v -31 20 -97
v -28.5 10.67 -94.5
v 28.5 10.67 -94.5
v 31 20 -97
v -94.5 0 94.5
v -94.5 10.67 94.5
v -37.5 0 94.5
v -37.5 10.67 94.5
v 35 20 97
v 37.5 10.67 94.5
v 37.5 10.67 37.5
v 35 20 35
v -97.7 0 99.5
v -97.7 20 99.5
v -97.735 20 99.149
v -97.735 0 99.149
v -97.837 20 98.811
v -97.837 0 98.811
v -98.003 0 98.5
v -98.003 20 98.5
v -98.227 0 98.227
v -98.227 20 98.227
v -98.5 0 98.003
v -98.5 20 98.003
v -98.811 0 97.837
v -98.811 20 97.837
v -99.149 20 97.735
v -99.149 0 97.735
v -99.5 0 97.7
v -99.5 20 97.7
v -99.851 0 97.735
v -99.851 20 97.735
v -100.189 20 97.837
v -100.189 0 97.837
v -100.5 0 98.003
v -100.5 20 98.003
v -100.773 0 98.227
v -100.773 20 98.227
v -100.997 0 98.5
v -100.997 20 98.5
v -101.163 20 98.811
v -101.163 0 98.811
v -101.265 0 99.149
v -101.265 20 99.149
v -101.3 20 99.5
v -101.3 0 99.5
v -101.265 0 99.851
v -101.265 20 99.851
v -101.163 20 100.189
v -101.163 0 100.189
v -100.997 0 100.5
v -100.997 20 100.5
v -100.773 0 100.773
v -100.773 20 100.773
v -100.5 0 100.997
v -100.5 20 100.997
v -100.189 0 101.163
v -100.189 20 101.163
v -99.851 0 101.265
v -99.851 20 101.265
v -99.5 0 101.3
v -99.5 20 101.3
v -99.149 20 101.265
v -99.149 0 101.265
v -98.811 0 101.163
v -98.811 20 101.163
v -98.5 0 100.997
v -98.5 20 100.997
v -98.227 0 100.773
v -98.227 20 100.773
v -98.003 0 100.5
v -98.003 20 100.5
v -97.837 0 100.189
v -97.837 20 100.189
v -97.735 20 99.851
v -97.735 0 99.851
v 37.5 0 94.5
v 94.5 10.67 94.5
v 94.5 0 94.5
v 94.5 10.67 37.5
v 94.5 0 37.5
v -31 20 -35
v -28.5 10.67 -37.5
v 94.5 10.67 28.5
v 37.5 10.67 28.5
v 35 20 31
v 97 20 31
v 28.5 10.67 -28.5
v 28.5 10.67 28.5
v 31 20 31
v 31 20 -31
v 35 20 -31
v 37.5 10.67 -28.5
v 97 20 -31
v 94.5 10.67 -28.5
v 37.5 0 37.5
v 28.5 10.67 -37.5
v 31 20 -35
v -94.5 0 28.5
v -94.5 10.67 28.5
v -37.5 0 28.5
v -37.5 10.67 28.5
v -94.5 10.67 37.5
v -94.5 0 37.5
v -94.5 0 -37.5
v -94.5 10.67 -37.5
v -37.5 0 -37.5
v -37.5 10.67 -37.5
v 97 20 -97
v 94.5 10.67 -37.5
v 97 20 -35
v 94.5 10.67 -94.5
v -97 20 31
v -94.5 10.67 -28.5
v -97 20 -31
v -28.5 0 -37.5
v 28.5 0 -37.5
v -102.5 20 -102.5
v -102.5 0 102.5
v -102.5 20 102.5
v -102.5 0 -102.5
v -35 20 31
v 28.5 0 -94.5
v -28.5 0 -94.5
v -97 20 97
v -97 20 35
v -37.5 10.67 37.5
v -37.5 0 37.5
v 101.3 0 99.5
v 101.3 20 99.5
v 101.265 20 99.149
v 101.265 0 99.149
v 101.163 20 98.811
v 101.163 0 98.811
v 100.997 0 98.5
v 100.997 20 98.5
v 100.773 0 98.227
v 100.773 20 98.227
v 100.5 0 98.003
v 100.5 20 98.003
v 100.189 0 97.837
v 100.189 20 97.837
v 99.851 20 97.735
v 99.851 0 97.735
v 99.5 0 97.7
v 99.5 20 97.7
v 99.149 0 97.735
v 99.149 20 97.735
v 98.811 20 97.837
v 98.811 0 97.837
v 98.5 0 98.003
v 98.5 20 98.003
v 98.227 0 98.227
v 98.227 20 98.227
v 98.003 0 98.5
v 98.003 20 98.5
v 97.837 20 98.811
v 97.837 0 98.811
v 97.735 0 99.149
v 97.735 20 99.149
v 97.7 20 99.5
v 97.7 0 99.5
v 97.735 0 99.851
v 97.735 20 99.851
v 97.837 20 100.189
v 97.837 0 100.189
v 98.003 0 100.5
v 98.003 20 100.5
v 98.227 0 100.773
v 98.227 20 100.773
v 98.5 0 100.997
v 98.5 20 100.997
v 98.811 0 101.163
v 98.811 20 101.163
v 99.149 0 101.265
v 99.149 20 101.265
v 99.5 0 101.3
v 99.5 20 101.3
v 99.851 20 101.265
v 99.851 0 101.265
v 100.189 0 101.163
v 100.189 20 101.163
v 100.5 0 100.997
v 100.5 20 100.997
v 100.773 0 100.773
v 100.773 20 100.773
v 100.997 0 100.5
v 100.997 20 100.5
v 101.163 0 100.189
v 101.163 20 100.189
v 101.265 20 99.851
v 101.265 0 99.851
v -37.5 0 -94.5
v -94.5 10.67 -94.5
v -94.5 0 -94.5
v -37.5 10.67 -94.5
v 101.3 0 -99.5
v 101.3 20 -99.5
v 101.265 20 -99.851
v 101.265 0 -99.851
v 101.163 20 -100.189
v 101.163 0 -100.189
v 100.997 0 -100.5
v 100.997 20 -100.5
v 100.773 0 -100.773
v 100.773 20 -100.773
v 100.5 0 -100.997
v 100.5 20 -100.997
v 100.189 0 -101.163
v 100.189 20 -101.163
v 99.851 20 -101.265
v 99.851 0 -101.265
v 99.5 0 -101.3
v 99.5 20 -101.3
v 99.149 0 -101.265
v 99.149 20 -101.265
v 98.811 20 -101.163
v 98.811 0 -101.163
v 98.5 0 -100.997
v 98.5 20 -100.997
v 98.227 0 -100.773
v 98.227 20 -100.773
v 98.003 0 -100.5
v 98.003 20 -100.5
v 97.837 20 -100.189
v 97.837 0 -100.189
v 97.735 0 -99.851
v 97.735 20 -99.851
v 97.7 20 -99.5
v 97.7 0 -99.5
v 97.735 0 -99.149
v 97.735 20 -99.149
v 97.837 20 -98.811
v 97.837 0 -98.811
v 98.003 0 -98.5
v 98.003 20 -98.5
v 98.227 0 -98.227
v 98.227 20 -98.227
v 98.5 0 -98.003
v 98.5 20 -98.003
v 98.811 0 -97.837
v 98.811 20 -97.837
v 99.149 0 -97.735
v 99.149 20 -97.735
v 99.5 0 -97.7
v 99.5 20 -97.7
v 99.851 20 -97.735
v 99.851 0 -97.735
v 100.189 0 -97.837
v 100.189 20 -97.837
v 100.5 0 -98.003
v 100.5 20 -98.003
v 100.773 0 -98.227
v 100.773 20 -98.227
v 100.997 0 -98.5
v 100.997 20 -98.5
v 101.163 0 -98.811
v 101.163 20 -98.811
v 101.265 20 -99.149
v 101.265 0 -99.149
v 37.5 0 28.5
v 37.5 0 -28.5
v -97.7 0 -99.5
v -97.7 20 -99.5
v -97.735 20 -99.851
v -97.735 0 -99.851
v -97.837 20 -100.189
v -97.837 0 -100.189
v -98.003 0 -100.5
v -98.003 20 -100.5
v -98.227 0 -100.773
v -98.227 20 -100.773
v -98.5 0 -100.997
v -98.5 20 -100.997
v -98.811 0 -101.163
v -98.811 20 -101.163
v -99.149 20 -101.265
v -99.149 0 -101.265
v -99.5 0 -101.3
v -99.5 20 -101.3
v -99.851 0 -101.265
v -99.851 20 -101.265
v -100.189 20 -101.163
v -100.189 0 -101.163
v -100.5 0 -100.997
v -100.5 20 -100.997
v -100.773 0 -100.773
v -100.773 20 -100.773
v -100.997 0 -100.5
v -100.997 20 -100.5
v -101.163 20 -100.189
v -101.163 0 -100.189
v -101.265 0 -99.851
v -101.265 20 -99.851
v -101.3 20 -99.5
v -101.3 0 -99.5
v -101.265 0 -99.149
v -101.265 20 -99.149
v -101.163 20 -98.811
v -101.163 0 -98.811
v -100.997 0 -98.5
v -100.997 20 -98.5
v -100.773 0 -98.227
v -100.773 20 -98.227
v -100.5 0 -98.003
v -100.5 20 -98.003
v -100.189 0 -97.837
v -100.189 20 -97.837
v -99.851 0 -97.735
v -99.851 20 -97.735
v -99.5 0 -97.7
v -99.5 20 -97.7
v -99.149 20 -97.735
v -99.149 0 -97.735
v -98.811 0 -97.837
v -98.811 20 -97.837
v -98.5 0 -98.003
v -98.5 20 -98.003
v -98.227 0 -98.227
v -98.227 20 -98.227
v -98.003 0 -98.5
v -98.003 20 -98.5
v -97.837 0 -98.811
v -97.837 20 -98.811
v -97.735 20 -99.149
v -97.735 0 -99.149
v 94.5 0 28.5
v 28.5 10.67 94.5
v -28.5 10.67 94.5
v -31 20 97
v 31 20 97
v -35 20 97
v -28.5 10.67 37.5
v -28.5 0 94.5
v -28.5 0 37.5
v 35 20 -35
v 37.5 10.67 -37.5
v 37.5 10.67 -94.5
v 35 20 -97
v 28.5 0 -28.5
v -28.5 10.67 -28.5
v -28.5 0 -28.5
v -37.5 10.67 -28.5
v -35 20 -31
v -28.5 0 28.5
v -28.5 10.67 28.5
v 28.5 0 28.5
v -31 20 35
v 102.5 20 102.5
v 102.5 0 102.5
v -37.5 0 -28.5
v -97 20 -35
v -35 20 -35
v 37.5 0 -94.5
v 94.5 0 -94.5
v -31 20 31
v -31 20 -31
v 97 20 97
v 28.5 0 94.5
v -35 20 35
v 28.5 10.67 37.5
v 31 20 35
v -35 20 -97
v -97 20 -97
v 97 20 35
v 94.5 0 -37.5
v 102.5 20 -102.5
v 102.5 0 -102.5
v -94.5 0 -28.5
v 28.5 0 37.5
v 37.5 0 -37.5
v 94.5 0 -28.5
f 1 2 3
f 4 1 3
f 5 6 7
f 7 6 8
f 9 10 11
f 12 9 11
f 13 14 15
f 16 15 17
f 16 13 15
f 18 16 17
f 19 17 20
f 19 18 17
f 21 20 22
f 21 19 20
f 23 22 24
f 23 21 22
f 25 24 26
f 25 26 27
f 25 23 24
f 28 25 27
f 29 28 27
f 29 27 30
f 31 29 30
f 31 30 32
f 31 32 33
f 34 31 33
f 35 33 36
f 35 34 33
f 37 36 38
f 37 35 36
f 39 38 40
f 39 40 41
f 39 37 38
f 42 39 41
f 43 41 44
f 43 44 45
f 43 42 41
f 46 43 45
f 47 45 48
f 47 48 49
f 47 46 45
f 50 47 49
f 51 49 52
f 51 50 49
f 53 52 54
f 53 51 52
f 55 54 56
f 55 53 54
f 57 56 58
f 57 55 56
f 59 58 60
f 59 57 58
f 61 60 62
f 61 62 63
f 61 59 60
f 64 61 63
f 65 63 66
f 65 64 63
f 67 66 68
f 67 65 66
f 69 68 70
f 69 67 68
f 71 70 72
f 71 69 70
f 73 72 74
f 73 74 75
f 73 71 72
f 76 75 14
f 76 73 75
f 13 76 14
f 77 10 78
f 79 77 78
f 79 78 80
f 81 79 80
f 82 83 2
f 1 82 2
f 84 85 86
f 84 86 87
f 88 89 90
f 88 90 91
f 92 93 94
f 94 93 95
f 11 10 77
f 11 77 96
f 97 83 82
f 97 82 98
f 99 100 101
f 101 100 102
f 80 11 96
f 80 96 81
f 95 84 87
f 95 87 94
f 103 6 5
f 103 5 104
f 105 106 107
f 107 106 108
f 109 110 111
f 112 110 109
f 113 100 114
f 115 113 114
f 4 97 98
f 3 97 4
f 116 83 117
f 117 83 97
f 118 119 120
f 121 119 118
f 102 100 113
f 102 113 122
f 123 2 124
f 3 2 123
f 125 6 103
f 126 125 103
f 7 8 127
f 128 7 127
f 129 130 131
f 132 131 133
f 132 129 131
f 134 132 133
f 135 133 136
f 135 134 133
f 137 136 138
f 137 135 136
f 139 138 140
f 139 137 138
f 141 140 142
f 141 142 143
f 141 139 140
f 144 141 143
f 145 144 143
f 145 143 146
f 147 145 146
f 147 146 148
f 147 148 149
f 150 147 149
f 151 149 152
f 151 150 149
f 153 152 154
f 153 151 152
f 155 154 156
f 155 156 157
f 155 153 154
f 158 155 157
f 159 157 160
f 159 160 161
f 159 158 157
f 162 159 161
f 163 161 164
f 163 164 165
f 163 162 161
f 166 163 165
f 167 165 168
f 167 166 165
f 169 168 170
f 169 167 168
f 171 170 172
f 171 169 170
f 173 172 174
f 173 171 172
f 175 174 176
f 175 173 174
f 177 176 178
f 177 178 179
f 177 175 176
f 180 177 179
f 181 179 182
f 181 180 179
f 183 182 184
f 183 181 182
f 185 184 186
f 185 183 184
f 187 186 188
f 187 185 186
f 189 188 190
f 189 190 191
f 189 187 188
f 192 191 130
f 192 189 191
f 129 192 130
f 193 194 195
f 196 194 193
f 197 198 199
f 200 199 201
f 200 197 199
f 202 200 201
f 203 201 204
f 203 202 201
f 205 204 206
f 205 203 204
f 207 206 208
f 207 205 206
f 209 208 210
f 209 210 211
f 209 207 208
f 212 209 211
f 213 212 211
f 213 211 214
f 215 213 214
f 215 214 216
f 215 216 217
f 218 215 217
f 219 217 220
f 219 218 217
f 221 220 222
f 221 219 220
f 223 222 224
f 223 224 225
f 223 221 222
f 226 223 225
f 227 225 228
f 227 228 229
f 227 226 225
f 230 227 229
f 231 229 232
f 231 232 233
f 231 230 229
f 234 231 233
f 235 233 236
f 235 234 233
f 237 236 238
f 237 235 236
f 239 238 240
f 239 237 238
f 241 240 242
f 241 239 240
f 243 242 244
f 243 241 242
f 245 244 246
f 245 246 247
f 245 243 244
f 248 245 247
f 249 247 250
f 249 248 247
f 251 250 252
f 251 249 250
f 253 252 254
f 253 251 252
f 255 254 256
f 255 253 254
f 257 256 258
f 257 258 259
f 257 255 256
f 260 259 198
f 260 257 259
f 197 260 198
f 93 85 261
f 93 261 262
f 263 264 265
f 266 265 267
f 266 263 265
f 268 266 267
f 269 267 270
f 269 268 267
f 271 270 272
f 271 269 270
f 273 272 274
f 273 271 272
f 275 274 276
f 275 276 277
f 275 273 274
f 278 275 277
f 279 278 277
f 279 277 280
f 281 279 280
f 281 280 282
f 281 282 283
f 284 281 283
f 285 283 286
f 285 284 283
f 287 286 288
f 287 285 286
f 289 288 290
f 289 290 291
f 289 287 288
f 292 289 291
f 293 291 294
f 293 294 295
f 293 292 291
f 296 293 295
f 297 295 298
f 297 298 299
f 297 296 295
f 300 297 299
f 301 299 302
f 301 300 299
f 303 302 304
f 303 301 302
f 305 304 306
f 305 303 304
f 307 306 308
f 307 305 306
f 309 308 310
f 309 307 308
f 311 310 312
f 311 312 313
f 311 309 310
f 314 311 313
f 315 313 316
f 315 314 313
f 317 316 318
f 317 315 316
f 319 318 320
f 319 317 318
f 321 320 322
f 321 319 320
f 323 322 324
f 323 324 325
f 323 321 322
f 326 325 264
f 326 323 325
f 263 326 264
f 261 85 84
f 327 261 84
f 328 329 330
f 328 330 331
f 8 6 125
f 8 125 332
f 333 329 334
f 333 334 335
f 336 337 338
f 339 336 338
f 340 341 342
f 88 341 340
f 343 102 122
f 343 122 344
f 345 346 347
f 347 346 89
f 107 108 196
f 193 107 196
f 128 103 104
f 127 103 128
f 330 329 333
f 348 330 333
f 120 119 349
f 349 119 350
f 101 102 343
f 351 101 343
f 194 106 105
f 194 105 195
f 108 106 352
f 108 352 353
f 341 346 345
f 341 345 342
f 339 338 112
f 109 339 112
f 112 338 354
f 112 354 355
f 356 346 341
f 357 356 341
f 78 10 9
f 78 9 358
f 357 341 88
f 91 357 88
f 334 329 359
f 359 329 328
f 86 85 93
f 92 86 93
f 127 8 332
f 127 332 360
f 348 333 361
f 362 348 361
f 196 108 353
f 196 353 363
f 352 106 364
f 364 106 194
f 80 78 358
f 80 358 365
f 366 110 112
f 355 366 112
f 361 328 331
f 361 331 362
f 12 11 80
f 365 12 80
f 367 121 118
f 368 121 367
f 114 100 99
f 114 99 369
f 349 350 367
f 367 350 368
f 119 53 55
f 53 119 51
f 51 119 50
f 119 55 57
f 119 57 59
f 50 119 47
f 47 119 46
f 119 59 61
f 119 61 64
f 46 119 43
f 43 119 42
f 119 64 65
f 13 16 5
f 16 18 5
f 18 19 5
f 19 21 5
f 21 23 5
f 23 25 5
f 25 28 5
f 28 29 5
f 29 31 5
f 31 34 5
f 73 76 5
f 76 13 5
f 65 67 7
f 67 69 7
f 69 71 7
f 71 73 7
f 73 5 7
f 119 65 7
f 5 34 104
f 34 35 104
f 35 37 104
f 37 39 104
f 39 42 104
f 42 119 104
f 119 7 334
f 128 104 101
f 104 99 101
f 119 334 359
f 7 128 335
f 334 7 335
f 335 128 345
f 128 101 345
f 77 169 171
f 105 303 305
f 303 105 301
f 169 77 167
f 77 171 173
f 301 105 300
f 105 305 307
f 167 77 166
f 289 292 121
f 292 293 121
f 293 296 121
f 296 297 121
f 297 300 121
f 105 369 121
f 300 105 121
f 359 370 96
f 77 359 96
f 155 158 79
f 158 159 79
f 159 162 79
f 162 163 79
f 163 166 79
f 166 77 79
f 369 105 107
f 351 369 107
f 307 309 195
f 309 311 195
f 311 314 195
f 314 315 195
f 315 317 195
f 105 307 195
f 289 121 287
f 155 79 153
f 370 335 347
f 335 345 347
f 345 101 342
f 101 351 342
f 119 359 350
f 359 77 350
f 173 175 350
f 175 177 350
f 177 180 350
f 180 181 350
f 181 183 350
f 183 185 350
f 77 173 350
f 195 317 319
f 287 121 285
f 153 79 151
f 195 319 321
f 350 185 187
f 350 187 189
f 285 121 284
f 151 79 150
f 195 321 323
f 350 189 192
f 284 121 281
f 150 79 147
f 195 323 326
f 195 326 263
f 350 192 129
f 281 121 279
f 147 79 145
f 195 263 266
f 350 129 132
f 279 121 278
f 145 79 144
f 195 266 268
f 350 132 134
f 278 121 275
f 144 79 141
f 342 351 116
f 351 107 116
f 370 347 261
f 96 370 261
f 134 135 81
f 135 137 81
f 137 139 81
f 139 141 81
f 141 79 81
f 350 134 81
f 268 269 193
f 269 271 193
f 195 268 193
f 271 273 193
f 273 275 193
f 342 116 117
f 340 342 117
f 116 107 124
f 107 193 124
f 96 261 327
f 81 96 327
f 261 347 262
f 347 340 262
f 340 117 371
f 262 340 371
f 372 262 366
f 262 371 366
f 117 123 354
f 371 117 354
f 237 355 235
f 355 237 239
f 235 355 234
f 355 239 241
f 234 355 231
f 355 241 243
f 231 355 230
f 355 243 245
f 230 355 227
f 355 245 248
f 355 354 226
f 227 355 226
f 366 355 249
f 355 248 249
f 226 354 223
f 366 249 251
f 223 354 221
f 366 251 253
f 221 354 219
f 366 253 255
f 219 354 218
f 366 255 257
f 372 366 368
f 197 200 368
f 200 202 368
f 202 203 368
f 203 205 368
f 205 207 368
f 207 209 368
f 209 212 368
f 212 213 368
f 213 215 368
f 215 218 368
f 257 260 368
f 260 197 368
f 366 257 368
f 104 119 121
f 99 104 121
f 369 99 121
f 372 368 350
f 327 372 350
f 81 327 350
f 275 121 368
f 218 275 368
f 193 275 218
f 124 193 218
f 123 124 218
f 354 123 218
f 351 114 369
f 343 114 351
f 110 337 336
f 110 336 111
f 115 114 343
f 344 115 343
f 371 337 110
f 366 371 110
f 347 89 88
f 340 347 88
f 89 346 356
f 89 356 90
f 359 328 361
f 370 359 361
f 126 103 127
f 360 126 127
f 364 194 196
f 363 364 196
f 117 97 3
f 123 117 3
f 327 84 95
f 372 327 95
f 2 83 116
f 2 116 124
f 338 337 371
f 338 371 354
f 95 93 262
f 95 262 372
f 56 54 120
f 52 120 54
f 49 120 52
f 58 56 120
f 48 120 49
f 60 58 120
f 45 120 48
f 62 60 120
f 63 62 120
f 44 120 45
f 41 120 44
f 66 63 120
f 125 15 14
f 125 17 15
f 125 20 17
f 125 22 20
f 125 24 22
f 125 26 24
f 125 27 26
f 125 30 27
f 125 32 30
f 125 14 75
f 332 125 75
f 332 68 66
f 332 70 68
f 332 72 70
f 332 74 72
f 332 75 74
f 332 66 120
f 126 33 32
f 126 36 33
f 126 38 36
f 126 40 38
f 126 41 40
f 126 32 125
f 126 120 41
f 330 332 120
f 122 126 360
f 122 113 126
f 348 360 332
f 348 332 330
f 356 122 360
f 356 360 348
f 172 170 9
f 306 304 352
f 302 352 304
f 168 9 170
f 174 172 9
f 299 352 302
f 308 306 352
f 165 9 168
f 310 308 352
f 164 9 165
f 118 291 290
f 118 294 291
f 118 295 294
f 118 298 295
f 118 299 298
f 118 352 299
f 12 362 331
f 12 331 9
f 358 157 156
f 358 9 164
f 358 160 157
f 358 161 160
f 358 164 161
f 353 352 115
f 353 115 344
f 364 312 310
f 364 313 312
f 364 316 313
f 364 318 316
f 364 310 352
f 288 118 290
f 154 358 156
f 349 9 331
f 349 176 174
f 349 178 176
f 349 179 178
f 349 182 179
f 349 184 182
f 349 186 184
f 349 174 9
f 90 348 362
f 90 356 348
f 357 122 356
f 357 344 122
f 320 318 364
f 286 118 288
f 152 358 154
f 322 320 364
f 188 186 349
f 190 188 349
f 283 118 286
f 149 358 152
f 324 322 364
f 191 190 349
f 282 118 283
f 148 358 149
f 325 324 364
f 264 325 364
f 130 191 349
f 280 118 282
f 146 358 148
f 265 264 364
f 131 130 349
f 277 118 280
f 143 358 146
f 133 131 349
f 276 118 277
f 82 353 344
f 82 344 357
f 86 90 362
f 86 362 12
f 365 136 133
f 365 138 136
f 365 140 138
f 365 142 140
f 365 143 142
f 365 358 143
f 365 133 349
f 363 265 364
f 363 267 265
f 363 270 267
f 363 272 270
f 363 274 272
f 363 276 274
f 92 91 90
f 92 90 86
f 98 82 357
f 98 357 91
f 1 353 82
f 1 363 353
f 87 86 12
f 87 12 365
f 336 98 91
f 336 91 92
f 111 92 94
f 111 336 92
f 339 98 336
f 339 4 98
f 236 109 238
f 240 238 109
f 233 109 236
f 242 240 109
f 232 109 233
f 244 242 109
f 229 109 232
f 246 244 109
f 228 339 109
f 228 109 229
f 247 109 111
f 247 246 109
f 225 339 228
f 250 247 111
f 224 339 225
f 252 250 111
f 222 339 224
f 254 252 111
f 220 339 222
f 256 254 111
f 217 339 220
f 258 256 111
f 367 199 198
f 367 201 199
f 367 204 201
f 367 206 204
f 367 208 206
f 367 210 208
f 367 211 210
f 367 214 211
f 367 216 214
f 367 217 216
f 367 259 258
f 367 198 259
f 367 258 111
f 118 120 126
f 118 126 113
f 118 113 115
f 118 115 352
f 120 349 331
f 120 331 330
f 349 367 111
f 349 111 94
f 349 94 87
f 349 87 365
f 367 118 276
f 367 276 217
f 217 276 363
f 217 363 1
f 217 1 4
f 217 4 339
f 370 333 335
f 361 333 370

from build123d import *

# Parameters (mm, degrees)
SKETCH2_W                    = 205
SKETCH2_H                    = 205
BOSS_EXTRUDE1_DEPTH          = 20
SKETCH3_W                    = 57
SKETCH3_H                    = 57
CUT_EXTRUDE1_DEPTH           = 147.330106267
LPATTERN1_COUNT              = 3
LPATTERN1_PITCH              = 66
LPATTERN1_COUNT_DIR2         = 3
LPATTERN1_PITCH_DIR2         = 66
CHAMFER1_SIZE                = 2.5
CHAMFER1_SIZE2               = 9.330127019
M3_CLEARANCE_HOLE1_OUTLINE_R = 1.8
M3_CLEARANCE_HOLE1_DEPTH     = 20


# Read off the part's stored shape, not the designer's step: M3 Clearance Hole1
with BuildPart() as part:
    # Sketch2 → Boss-Extrude1 (new body)
    with BuildSketch(Plane(origin=(0, 0, 0), x_dir=(1, 0, 0), z_dir=(0, 1, 0))):
        Rectangle(SKETCH2_W, SKETCH2_H)
    extrude(amount=BOSS_EXTRUDE1_DEPTH)

    # Sketch3 → Cut-Extrude1 (cut, through all)
    with BuildSketch(Plane(origin=(0, 20, 0), x_dir=(1, 0, 0), z_dir=(0, 1, 0))):
        with Locations((-66, 66)):
            Rectangle(SKETCH3_W, SKETCH3_H)
    cut_extrude1 = extrude(amount=-CUT_EXTRUDE1_DEPTH, mode=Mode.SUBTRACT)

    # LPattern1: Cut-Extrude1 3 × 3
    with Locations(*[(i * LPATTERN1_PITCH, 0, j * LPATTERN1_PITCH_DIR2) for i in range(LPATTERN1_COUNT) for j in range(LPATTERN1_COUNT_DIR2) if (i, j) != (0, 0)]):
        add(cut_extrude1, mode=Mode.SUBTRACT)

    # Chamfer1
    chamfer1_edges = [part.edges().sort_by_distance(p)[0] for p in [
        (94.5, 20, 66),
        (66, 20, 94.5),
        (37.5, 20, 66),
        (66, 20, 37.5),
        (-37.5, 20, -66),
        (-66, 20, -94.5),
        (-94.5, 20, -66),
        (-66, 20, -37.5),
        (28.5, 20, -66),
        (0, 20, -94.5),
        (-28.5, 20, -66),
        (0, 20, -37.5),
        (94.5, 20, -66),
        (66, 20, -37.5),
        (37.5, 20, -66),
        (66, 20, -94.5),
        (-37.5, 20, 0),
        (-66, 20, 28.5),
        (-94.5, 20, 0),
        (-66, 20, -28.5),
        (28.5, 20, 0),
        (0, 20, 28.5),
        (-28.5, 20, 0),
        (0, 20, -28.5),
        (94.5, 20, 0),
        (66, 20, 28.5),
        (37.5, 20, 0),
        (66, 20, -28.5),
        (-37.5, 20, 66),
        (-66, 20, 94.5),
        (-94.5, 20, 66),
        (-66, 20, 37.5),
        (28.5, 20, 66),
        (0, 20, 94.5),
        (-28.5, 20, 66),
        (0, 20, 37.5),
    ]]
    chamfer1_side = [part.faces().sort_by_distance(p)[0] for p in [
        (0, 20, 99.600862197),
    ]]
    chamfer(chamfer1_edges, length=CHAMFER1_SIZE, length2=CHAMFER1_SIZE2, reference=chamfer1_side[0])

    # M3 Clearance Hole1 outline → M3 Clearance Hole1 (cut)
    with BuildSketch(Plane(origin=(0, 0, 0), x_dir=(1, 0, 0), z_dir=(0, 1, 0))):
        with Locations((-99.5, -99.5)):
            Circle(M3_CLEARANCE_HOLE1_OUTLINE_R)
        with Locations((99.5, 99.5)):
            Circle(M3_CLEARANCE_HOLE1_OUTLINE_R)
        with Locations((99.5, -99.5)):
            Circle(M3_CLEARANCE_HOLE1_OUTLINE_R)
        with Locations((-99.5, 99.5)):
            Circle(M3_CLEARANCE_HOLE1_OUTLINE_R)
    extrude(amount=M3_CLEARANCE_HOLE1_DEPTH, mode=Mode.SUBTRACT)


solid = part.part
